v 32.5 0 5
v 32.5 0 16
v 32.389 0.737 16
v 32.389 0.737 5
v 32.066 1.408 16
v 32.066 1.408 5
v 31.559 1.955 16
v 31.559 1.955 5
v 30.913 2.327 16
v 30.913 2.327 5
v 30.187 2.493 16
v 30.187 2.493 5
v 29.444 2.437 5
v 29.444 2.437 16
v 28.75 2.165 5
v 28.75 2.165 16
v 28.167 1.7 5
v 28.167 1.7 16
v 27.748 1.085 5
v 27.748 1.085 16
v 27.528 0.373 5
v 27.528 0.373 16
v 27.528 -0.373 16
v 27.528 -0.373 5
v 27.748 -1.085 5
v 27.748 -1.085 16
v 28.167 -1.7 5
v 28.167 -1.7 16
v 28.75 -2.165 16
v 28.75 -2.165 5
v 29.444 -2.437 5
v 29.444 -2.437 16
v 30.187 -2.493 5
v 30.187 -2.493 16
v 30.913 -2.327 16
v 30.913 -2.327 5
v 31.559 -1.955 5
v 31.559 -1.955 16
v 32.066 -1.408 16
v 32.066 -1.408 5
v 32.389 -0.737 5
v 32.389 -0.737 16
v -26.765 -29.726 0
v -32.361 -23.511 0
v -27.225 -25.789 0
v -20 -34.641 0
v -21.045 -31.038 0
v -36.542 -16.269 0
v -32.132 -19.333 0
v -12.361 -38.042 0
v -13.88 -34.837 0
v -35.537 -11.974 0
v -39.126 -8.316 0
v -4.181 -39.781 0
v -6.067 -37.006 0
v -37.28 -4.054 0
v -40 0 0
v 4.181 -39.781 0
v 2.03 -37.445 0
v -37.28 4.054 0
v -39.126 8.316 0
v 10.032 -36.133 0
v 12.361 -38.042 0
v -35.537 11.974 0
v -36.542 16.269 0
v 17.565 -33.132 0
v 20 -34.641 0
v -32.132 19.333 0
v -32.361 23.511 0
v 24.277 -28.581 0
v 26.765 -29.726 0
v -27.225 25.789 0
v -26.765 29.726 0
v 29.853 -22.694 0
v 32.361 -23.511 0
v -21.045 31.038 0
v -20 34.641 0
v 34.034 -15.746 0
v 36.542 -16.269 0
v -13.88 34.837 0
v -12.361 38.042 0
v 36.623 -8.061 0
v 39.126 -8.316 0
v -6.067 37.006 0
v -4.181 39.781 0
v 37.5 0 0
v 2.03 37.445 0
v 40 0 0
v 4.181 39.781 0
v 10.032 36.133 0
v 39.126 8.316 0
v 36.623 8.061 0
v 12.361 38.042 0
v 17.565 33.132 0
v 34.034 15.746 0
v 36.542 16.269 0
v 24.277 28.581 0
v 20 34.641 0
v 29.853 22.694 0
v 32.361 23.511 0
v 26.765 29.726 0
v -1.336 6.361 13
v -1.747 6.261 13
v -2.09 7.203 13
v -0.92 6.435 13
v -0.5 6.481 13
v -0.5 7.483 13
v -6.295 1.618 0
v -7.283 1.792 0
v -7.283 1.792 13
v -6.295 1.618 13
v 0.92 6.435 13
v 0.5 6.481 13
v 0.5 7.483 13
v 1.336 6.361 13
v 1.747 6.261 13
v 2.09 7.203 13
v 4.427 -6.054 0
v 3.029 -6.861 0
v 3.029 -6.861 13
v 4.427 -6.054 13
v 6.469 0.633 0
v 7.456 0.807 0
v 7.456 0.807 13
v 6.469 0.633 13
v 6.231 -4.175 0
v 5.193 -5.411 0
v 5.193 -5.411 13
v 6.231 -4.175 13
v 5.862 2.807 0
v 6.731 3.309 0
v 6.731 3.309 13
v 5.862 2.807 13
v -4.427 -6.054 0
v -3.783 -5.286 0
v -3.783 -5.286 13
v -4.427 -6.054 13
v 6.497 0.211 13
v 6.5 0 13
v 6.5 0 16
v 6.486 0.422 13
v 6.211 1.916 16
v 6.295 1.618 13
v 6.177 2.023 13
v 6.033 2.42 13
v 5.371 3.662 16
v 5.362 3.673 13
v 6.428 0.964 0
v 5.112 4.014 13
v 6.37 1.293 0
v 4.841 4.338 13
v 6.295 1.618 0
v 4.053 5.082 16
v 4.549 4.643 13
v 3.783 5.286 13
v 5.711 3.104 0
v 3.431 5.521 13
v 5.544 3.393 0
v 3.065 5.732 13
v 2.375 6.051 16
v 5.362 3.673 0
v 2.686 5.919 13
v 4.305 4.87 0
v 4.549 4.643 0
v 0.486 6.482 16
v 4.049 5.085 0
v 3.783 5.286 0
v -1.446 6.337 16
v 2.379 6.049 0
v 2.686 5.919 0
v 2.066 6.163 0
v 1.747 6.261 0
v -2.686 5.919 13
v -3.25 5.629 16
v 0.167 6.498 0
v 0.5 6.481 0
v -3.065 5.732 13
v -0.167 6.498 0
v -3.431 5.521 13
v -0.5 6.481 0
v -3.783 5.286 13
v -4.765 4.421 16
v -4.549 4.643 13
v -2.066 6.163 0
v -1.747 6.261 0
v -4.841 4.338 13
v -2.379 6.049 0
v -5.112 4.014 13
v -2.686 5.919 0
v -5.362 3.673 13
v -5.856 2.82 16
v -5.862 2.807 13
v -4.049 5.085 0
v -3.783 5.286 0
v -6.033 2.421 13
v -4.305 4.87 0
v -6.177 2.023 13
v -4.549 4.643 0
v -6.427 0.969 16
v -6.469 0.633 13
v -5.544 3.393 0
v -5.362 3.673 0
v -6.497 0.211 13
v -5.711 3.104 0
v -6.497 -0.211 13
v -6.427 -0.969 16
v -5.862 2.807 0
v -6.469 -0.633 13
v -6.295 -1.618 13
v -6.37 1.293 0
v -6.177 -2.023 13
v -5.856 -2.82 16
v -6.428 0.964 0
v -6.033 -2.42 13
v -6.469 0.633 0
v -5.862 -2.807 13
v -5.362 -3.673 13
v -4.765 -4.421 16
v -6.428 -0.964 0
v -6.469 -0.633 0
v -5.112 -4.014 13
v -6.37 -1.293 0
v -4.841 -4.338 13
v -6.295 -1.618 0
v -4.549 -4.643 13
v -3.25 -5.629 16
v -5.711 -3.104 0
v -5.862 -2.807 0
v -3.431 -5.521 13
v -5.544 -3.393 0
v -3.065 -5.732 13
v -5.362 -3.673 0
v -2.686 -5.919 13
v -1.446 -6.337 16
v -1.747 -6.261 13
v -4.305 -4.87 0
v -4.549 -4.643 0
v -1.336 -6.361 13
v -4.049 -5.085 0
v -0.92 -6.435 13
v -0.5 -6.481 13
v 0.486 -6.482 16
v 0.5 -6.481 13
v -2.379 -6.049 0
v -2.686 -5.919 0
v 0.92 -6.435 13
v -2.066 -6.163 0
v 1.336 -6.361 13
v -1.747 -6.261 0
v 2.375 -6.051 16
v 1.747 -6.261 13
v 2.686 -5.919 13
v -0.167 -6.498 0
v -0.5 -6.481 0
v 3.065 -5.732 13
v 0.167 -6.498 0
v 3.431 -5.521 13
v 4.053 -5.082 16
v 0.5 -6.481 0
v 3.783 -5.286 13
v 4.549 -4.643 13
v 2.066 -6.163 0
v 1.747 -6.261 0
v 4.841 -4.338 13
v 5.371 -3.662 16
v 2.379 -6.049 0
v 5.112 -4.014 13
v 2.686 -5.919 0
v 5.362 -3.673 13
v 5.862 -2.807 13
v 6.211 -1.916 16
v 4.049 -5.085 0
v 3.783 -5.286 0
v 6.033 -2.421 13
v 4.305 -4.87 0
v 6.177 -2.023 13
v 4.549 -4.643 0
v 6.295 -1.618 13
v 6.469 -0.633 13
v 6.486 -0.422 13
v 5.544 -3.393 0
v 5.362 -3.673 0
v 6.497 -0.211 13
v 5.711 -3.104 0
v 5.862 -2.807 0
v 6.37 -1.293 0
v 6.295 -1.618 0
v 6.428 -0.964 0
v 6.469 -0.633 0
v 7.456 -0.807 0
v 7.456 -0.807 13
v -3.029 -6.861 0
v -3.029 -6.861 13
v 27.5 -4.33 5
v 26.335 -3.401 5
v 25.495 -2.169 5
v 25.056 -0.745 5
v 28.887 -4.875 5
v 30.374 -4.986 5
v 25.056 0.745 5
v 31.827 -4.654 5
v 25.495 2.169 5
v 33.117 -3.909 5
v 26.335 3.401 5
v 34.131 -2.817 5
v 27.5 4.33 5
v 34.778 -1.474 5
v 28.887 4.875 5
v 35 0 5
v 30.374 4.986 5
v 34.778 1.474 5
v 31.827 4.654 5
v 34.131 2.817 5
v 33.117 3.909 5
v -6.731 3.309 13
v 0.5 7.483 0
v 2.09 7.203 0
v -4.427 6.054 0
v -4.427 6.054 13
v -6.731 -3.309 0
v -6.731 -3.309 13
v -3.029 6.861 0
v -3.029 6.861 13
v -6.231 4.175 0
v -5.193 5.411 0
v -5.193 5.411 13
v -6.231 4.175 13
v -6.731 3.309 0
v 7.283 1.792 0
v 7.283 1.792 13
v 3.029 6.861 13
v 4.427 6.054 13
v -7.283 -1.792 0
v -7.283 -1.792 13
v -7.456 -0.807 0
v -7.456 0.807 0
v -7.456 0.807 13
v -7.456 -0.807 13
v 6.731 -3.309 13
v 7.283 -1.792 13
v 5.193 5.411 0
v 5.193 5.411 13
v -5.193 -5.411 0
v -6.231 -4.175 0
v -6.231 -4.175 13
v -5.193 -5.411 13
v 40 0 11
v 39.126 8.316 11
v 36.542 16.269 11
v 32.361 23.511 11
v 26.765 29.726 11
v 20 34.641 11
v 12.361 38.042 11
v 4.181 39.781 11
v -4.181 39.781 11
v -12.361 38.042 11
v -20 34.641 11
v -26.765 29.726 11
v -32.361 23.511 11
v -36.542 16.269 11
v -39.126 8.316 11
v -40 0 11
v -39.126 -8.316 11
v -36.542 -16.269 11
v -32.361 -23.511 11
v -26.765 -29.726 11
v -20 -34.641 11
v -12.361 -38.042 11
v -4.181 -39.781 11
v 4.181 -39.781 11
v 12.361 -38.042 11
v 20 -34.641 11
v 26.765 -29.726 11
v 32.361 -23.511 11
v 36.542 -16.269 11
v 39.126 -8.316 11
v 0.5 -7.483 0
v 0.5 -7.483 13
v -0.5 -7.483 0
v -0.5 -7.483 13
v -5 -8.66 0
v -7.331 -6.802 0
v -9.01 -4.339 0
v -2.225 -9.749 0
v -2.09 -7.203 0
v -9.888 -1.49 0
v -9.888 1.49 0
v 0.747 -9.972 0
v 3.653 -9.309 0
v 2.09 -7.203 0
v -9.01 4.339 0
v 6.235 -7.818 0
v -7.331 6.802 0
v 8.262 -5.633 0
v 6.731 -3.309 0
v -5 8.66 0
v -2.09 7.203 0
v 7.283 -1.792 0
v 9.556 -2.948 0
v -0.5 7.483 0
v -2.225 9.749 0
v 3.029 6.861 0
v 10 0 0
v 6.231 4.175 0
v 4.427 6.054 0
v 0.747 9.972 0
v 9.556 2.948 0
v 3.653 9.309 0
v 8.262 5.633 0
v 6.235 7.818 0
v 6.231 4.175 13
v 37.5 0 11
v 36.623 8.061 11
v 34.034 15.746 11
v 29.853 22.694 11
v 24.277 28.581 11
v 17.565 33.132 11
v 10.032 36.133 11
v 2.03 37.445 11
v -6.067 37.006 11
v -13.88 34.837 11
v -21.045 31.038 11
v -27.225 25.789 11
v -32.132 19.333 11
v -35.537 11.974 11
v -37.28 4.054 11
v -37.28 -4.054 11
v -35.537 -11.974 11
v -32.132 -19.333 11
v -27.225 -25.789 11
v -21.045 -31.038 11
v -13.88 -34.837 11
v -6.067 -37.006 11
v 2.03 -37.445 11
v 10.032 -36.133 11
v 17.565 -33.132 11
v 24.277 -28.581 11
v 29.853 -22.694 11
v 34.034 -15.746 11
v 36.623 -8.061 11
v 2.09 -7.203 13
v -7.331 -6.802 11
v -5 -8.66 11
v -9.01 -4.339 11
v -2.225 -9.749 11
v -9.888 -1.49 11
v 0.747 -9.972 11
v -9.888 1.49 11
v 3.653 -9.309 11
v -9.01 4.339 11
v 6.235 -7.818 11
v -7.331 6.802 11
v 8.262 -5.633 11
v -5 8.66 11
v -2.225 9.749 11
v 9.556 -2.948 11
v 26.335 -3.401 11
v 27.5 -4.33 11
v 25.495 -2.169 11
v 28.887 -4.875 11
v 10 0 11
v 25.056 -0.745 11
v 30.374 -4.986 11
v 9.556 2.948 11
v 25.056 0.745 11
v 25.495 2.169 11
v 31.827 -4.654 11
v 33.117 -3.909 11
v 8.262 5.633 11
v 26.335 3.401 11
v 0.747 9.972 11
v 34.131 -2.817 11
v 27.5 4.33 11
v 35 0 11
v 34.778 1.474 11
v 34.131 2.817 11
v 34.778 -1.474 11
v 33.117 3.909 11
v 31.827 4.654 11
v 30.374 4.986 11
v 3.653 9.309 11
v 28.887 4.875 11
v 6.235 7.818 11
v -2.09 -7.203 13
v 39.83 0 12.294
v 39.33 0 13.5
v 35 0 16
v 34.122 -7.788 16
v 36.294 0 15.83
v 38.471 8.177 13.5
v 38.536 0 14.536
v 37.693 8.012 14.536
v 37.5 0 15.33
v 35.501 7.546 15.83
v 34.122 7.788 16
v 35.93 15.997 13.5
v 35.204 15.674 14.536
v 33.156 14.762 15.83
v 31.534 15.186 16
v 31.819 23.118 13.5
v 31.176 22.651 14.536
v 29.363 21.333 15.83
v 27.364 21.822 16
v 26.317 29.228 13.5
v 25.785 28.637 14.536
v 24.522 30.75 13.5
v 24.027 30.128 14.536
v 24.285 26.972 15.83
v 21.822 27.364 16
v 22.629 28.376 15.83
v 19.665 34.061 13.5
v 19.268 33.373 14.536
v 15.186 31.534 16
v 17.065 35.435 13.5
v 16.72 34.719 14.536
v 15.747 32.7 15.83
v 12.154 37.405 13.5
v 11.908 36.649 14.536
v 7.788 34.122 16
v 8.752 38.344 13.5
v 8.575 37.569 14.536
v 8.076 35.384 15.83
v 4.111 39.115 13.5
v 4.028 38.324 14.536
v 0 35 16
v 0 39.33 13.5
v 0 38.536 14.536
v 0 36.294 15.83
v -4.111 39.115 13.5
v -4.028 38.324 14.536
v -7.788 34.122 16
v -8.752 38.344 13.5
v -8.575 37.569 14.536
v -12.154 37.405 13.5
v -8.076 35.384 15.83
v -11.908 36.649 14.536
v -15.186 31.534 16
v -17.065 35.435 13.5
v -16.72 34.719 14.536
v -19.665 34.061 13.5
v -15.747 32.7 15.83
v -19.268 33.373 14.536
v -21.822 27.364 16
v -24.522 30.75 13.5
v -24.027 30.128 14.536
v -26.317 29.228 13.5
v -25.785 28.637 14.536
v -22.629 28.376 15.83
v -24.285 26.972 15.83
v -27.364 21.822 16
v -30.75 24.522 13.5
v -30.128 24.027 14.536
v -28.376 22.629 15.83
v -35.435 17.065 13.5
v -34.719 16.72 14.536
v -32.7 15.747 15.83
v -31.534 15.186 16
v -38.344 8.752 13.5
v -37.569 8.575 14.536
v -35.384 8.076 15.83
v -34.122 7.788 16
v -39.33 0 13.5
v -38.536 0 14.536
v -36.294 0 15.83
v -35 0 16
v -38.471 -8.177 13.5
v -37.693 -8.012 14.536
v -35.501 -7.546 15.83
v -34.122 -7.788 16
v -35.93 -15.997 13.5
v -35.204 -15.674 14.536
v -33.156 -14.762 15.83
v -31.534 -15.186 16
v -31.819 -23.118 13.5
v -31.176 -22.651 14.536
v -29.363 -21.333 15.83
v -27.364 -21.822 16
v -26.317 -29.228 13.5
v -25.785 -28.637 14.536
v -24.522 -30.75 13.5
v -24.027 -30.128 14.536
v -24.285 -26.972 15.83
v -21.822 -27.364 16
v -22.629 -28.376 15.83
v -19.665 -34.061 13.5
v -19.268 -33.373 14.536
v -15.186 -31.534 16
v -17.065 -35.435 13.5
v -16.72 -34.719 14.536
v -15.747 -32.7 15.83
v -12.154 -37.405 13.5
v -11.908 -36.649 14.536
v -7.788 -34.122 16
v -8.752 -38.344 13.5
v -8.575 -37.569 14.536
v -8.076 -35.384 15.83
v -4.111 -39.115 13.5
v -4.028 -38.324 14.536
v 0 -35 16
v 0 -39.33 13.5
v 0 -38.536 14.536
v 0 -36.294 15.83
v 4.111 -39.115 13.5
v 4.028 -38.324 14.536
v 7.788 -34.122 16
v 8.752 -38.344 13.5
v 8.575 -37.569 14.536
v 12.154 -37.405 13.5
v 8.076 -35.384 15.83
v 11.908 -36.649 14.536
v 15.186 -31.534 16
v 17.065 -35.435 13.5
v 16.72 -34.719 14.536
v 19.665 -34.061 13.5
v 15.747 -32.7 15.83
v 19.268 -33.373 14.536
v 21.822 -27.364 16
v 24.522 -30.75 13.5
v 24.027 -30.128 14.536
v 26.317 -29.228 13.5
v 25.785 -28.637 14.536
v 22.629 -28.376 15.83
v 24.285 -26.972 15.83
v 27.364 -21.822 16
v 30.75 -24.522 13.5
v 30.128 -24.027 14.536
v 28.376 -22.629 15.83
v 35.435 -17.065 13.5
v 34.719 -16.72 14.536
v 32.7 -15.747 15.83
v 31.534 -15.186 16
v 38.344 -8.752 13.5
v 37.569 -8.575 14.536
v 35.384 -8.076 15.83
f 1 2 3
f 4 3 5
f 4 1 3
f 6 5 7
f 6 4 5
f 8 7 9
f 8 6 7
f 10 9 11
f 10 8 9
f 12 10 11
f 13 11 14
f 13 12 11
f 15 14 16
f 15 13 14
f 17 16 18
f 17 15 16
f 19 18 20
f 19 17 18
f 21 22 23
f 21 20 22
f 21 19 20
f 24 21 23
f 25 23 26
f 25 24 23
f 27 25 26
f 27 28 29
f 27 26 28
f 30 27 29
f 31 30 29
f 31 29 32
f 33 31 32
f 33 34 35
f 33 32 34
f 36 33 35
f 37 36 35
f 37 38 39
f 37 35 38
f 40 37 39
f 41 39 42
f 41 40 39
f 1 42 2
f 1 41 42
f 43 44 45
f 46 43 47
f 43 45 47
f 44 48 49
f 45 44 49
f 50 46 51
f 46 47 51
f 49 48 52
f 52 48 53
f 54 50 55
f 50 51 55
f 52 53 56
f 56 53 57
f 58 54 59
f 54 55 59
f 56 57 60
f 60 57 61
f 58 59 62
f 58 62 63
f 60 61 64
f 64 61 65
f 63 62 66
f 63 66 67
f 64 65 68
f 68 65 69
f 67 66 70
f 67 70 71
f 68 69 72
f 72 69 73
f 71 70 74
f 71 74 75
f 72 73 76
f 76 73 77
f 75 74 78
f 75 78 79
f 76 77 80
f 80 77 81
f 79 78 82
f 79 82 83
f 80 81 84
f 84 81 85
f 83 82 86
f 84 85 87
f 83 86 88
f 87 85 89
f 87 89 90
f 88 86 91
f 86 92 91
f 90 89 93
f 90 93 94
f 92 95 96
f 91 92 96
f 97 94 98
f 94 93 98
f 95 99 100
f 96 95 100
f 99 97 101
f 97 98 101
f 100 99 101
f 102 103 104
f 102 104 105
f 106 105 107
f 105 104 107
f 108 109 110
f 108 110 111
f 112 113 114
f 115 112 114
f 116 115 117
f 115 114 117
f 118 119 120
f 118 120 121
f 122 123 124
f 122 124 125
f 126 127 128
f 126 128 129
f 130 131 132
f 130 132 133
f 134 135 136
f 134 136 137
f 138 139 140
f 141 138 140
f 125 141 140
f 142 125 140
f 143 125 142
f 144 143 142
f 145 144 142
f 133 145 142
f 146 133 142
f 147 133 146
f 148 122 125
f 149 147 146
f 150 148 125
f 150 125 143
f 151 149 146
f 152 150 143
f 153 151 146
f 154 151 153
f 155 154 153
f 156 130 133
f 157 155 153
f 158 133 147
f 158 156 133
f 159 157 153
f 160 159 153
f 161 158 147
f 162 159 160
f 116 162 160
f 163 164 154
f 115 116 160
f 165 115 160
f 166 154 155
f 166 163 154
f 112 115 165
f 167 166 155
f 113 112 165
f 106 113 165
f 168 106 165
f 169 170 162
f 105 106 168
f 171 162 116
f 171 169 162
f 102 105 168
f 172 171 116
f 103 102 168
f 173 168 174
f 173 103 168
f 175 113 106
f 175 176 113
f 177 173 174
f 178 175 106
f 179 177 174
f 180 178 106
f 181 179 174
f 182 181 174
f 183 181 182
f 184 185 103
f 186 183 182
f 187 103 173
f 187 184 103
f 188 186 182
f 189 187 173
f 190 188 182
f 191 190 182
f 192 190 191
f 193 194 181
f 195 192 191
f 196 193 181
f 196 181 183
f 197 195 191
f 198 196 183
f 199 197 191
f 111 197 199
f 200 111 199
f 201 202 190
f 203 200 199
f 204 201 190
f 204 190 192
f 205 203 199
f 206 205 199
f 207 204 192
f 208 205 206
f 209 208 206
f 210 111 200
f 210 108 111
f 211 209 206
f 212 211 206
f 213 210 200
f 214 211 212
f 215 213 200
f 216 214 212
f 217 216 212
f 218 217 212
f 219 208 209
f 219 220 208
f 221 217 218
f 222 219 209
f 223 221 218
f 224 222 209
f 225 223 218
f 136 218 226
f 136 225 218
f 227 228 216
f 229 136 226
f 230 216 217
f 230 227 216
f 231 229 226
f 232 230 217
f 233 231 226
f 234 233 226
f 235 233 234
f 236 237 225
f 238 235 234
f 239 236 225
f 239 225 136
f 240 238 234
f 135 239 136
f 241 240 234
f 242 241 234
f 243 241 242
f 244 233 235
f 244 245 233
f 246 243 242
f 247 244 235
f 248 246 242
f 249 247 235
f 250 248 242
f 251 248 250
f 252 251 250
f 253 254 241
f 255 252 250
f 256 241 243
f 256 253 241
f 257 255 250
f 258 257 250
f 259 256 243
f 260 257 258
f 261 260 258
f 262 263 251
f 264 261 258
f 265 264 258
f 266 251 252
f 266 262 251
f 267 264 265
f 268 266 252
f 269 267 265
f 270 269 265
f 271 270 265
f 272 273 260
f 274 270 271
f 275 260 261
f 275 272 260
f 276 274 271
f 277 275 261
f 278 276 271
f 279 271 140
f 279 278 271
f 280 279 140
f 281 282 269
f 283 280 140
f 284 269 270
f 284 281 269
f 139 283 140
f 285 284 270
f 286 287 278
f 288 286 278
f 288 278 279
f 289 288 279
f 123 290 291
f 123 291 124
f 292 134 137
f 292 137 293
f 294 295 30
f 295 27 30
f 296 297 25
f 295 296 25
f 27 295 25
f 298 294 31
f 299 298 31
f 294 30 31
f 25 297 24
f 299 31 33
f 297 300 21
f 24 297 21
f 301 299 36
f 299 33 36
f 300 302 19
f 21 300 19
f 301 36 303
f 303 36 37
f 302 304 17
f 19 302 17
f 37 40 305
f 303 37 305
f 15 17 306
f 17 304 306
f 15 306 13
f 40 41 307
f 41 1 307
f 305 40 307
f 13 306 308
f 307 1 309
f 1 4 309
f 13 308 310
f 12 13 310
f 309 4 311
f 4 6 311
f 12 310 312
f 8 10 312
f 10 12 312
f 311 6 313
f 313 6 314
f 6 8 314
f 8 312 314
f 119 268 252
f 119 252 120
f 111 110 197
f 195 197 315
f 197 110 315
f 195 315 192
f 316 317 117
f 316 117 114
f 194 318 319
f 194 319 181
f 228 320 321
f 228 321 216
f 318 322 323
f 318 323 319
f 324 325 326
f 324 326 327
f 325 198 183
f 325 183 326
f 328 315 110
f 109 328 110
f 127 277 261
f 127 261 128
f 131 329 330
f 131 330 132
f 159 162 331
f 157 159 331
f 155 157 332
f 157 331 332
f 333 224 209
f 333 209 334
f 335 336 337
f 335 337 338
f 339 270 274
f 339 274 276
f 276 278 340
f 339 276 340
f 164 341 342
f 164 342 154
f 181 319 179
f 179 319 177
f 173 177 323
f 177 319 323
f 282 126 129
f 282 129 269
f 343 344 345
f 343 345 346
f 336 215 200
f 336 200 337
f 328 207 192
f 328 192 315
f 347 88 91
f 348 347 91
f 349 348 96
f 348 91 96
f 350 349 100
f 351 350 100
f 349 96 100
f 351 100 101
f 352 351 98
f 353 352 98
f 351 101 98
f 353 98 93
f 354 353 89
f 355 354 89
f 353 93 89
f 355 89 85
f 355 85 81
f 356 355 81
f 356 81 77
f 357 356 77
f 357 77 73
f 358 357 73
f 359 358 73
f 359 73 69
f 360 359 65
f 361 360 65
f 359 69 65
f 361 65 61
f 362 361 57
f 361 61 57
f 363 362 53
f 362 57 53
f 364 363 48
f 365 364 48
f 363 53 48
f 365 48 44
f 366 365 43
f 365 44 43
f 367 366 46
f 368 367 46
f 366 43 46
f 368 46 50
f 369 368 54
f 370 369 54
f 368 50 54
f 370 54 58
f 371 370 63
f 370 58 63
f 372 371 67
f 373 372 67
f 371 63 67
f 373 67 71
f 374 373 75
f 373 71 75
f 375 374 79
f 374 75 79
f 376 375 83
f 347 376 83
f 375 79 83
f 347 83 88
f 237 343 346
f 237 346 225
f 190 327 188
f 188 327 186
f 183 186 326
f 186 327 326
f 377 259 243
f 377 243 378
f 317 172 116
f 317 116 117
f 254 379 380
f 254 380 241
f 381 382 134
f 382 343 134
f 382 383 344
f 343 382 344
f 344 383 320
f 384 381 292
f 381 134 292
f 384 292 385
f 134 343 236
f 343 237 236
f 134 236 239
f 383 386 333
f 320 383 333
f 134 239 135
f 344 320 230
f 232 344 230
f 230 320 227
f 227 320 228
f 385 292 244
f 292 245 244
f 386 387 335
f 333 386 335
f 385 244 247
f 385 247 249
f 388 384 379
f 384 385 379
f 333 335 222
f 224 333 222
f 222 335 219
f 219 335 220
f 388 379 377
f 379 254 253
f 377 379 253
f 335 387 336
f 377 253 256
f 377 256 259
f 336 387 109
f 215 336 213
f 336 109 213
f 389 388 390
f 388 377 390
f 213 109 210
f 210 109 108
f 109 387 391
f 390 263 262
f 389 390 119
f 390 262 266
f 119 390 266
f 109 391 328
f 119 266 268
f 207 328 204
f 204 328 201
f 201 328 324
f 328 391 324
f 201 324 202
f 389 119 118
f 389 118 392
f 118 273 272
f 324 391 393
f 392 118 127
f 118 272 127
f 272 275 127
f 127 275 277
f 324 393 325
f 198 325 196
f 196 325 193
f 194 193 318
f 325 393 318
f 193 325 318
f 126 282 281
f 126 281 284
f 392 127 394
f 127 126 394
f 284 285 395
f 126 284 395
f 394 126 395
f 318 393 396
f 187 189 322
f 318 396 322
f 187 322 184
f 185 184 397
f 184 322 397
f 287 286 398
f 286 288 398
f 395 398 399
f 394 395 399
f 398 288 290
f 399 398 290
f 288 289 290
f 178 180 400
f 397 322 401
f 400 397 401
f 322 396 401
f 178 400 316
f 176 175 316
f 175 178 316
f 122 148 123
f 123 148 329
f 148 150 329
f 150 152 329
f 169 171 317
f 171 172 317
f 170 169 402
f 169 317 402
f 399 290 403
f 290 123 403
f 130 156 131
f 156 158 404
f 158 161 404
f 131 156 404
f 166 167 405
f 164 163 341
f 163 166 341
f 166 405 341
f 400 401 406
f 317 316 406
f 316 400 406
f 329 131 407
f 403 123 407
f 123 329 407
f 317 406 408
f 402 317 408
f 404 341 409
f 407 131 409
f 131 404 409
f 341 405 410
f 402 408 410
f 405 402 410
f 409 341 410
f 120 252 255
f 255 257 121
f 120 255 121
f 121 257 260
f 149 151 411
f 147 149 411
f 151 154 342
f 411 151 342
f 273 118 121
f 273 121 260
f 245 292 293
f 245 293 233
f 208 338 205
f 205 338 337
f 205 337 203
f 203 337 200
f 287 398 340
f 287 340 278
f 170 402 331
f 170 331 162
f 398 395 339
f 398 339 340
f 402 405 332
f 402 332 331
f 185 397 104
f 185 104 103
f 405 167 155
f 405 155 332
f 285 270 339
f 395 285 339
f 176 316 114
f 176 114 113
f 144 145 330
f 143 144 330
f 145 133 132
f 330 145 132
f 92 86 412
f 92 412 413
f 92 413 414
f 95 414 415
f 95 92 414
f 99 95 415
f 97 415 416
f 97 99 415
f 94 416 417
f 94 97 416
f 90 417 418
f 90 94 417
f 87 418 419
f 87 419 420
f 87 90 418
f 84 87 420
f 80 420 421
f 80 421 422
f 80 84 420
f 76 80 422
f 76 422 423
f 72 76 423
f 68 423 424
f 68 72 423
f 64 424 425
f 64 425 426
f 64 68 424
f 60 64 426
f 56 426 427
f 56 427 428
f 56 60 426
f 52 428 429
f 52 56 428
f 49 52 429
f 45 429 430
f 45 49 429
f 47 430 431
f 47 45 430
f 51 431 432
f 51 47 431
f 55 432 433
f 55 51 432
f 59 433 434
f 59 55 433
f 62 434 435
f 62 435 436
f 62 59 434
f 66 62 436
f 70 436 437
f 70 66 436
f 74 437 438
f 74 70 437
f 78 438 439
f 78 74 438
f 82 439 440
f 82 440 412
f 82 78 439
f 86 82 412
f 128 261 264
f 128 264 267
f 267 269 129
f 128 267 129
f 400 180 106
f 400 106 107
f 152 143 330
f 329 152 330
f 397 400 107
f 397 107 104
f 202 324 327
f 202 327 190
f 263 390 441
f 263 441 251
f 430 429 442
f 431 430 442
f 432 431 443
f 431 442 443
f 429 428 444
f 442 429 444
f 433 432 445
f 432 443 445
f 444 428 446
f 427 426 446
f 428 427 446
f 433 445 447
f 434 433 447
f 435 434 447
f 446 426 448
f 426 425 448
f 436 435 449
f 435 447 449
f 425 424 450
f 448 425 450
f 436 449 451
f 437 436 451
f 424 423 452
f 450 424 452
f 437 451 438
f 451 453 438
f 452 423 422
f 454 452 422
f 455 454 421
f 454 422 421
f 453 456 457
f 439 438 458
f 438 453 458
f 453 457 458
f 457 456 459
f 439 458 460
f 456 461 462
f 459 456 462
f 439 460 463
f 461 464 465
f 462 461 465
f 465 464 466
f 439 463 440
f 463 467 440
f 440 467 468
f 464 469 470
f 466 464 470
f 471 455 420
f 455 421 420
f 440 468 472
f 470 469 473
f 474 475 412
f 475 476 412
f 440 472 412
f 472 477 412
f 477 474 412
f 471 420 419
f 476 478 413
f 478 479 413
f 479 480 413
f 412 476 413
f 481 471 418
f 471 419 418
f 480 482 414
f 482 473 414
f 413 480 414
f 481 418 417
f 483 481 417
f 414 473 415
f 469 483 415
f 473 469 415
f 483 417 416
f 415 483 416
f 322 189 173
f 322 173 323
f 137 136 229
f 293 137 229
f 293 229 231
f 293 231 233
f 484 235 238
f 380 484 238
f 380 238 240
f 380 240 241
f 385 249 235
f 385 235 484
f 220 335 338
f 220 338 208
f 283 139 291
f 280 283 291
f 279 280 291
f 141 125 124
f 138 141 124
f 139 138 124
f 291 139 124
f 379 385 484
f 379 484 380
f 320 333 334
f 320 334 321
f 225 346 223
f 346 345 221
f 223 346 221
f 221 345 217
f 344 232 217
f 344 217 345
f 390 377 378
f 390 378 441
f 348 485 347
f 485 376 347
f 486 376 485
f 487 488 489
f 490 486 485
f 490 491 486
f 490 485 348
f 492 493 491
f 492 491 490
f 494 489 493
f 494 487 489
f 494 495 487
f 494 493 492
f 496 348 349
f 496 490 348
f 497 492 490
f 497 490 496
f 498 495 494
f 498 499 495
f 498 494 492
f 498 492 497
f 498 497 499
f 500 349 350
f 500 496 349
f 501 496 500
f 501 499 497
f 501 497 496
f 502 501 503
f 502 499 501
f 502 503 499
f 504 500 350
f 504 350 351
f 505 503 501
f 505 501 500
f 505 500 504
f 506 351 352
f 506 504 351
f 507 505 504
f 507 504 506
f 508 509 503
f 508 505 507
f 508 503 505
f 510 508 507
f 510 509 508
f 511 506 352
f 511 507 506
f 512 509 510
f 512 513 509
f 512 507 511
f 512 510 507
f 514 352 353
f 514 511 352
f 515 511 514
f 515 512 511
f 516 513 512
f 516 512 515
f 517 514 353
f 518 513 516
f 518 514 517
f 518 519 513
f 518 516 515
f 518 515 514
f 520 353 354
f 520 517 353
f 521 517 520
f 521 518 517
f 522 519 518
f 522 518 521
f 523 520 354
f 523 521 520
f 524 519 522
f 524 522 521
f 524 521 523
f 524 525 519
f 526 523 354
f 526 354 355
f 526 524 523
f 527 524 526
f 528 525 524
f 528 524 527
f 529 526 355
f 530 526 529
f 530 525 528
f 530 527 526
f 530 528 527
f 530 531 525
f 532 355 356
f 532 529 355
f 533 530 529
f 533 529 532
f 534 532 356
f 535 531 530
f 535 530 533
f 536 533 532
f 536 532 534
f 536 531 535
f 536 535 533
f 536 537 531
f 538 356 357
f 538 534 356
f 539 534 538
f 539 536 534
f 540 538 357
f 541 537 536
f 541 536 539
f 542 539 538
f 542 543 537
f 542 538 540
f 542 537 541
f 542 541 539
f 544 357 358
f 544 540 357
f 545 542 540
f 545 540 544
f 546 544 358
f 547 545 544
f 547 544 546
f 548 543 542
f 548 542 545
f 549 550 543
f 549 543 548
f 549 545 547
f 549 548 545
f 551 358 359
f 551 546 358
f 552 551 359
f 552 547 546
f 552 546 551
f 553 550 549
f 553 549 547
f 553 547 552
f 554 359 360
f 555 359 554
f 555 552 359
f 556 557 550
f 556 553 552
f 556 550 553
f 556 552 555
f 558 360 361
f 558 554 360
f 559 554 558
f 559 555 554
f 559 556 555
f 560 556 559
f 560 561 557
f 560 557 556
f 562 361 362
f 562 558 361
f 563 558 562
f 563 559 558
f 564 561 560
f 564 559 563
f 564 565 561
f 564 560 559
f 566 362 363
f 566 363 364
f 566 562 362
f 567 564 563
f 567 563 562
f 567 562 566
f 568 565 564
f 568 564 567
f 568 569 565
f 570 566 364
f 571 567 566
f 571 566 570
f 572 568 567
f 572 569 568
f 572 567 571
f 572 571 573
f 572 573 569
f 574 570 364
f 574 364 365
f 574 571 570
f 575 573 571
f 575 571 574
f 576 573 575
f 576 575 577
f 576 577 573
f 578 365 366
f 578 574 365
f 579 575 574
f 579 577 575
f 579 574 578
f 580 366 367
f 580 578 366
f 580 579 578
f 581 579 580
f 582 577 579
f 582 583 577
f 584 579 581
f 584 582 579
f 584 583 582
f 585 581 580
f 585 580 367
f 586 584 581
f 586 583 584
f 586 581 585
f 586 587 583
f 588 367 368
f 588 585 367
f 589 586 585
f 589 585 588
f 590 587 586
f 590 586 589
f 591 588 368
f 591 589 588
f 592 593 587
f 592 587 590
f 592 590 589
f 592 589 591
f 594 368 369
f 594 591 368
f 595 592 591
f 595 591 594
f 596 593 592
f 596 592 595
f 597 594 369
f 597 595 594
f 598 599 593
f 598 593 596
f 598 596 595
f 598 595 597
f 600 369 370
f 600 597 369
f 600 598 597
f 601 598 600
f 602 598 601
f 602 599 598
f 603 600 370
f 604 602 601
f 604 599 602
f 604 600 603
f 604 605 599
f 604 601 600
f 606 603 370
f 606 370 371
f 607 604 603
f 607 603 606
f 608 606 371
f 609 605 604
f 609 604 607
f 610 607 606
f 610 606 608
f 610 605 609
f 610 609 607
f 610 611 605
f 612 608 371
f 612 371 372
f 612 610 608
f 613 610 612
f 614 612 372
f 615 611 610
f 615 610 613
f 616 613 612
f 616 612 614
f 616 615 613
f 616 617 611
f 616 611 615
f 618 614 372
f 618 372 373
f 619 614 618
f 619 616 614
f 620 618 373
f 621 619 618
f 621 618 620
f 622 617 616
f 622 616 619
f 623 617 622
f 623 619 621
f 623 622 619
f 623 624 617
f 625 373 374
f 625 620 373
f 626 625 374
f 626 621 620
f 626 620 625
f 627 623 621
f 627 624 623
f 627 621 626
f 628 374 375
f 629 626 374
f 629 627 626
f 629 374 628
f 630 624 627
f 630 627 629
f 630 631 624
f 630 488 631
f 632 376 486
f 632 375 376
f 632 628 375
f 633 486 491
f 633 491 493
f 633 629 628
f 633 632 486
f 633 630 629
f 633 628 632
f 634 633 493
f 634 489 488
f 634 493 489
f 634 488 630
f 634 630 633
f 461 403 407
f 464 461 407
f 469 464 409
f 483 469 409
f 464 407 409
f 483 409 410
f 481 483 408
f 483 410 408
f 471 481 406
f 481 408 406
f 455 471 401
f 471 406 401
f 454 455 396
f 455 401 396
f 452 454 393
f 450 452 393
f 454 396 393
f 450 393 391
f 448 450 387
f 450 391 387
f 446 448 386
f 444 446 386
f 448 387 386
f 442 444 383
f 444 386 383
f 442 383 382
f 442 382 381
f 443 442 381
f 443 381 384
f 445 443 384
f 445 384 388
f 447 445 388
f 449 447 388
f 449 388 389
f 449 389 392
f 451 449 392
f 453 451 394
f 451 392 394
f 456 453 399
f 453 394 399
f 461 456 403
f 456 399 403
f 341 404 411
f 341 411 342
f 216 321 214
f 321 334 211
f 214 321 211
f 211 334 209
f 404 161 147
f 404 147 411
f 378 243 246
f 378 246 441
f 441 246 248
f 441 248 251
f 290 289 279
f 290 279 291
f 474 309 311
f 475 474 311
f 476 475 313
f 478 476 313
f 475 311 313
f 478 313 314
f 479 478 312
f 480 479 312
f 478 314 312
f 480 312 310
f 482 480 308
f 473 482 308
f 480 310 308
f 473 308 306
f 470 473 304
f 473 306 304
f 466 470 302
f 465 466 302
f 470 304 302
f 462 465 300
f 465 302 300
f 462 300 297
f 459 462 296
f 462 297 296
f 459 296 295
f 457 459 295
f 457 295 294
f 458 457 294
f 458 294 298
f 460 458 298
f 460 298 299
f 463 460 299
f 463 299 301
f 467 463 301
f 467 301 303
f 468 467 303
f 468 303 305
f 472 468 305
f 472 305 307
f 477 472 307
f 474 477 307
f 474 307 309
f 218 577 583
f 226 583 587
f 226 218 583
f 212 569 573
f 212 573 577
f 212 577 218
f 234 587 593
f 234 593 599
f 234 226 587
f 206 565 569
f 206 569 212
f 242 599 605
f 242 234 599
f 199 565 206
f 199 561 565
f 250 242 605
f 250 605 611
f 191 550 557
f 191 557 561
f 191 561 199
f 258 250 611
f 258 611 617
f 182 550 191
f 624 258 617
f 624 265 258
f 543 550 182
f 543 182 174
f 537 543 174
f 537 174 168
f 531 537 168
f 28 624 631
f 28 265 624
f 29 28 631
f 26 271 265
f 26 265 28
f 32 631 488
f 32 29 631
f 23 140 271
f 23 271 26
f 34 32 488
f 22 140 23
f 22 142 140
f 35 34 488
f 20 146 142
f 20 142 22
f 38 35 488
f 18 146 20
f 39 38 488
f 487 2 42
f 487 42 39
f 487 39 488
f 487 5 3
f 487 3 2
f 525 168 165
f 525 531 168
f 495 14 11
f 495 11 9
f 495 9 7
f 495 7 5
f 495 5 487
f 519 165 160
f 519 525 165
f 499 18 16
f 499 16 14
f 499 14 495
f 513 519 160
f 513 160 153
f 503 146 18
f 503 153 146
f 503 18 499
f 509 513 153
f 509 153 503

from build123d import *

# Parameters (mm, degrees)
F1_R      = 40
F2_DEPTH  = 16
F3_DEPTH  = 13
F4_R      = 6.5
F5_DEPTH  = 16.001
F6_R      = 2.5
F7_DEPTH  = 16.001
F8_R      = 5
F9_R      = 37.5
F9_R_2    = 10
F9_R_3    = 5
F10_DEPTH = 11
F11_DEPTH = 5


with BuildPart() as f2:
    # F1 (on Top) → F2 (new body)
    with BuildSketch(Plane.XY):
        Circle(F1_R)
    extrude(amount=F2_DEPTH)

    # F0 (on Top) → F3 (cut)
    with BuildSketch(Plane.XY):
        Polygon((0.5, 7.4833147735), (0.5, 6.4807406984), (-0.5, 6.4807406984), (-0.5, 7.4833147735), (-2.0895980578, 7.2030257501), (-1.746697532, 6.2609142888), (-2.6863901539, 5.9188941485), (-3.0292906797, 6.8610056098), (-4.4271597759, 6.0539455166), (-3.782717585, 5.2859292156), (-4.54876203, 4.6431416082), (-5.193204221, 5.4111579093), (-6.2307406865, 4.1746701064), (-5.3624860697, 3.6733830663), (-5.8624860722, 2.807357664), (-6.730740689, 3.308644704), (-7.2828023136, 1.7918678691), (-6.2954595919, 1.6177727054), (-6.4691077722, 0.6329649529), (-7.4564504939, 0.8070601166), (-7.456450498, -0.8070600785), (-6.4691077754, -0.6329649198), (-6.2954596002, -1.6177726732), (-7.2828023228, -1.7918678319), (-6.7307407059, -3.3086446696), (-5.8624860865, -2.807357634), (-5.3624860885, -3.6733830389), (-6.2307407079, -4.1746700745), (-5.1932042487, -5.4111578827), (-4.5487620538, -4.643141585), (-3.782717612, -5.2859291963), (-4.4271598069, -6.053945494), (-3.0292907148, -6.8610055943), (-2.6863901841, -5.9188941348), (-1.746697564, -6.2609142799), (-2.0895980946, -7.2030257394), (-0.5000000128, -7.4833147727), (-0.500000011, -6.4807406976), (0.499999989, -6.4807406993), (0.4999999872, -7.4833147744), (2.0895980701, -7.2030257465), (1.7466975426, -6.2609142858), (2.686390164, -5.9188941439), (3.0292906914, -6.8610056046), (4.4271597862, -6.0539455091), (3.782717594, -5.2859292092), (4.5487620379, -4.6431416005), (5.1932042302, -5.4111579004), (6.2307406937, -4.1746700957), (5.362486076, -3.6733830572), (5.862486077, -2.807357654), (6.7307406946, -3.3086446925), (7.2828023167, -1.7918678567), (6.2954595947, -1.6177726947), (6.4691077733, -0.6329649418), (7.4564504953, -0.8070601039), (7.4564504967, 0.8070600912), (6.4691077744, 0.6329649308), (6.2954595974, 1.6177726839), (7.2828023197, 1.7918678443), (6.7307407003, 3.3086446811), (5.8624860818, 2.807357644), (5.3624860822, 3.673383048), (6.2307407008, 4.1746700851), (5.1932042394, 5.4111578916), (4.5487620458, 4.6431415927), (3.782717603, 5.2859292027), (4.4271597966, 6.0539455016), (3.0292907031, 6.8610055995), (2.686390174, 5.9188941393), (1.7466975533, 6.2609142829), (2.0895980824, 7.203025743), align=None)
    extrude(amount=F3_DEPTH, mode=Mode.SUBTRACT)

    # F4 (on Top) → F5 (cut, through all)
    with BuildSketch(Plane.XY):
        Circle(F4_R)
    extrude(amount=F5_DEPTH, mode=Mode.SUBTRACT)

    # F6 (on Top) → F7 (cut, through all)
    with BuildSketch(Plane.XY):
        with Locations((30, 0)):
            Circle(F6_R)
    extrude(amount=F7_DEPTH, mode=Mode.SUBTRACT)

    # F8
    f8_edges = [f2.edges().sort_by_distance(p)[0] for p in [
        (-40, 0, 16),
    ]]
    fillet(f8_edges, radius=F8_R)

    # F9 (on Top) → F10 (cut)
    with BuildSketch(Plane.XY):
        Circle(F9_R)
        Circle(F9_R_2, mode=Mode.SUBTRACT)
        with Locations((30, 0)):
            Circle(F9_R_3, mode=Mode.SUBTRACT)
    extrude(amount=F10_DEPTH, mode=Mode.SUBTRACT)

    # F11 (cut): a face of the model
    f11_faces = [f2.faces().sort_by_distance(p)[0] for p in [
        (25.1414213562, 0, 0),
    ]]
    extrude(f11_faces, amount=-F11_DEPTH, mode=Mode.SUBTRACT)


solid = f2.part
